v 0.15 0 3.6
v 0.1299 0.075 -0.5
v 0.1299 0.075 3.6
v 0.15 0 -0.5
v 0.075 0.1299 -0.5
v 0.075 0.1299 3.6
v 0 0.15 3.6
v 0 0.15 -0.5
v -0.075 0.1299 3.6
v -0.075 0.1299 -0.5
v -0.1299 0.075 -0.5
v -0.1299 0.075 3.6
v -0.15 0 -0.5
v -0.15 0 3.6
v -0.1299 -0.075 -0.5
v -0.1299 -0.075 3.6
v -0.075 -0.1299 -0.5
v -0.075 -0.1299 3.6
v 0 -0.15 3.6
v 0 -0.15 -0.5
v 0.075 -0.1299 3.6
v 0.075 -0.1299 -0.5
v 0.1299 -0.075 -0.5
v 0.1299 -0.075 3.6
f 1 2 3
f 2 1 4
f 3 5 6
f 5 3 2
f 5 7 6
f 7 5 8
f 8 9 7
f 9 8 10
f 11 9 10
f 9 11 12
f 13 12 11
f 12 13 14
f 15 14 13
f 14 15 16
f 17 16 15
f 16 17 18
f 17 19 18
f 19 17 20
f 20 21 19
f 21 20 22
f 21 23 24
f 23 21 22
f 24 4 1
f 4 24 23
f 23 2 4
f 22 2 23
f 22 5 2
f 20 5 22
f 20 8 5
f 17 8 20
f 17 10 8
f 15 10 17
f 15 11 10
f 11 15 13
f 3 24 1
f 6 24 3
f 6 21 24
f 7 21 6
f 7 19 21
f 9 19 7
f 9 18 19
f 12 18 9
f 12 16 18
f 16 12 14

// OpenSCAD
// Tent shell kit: chimney. See lib/lodge_kit.scad.
include <lib/lodge_kit.scad>
kind = "tent";
chimney();
